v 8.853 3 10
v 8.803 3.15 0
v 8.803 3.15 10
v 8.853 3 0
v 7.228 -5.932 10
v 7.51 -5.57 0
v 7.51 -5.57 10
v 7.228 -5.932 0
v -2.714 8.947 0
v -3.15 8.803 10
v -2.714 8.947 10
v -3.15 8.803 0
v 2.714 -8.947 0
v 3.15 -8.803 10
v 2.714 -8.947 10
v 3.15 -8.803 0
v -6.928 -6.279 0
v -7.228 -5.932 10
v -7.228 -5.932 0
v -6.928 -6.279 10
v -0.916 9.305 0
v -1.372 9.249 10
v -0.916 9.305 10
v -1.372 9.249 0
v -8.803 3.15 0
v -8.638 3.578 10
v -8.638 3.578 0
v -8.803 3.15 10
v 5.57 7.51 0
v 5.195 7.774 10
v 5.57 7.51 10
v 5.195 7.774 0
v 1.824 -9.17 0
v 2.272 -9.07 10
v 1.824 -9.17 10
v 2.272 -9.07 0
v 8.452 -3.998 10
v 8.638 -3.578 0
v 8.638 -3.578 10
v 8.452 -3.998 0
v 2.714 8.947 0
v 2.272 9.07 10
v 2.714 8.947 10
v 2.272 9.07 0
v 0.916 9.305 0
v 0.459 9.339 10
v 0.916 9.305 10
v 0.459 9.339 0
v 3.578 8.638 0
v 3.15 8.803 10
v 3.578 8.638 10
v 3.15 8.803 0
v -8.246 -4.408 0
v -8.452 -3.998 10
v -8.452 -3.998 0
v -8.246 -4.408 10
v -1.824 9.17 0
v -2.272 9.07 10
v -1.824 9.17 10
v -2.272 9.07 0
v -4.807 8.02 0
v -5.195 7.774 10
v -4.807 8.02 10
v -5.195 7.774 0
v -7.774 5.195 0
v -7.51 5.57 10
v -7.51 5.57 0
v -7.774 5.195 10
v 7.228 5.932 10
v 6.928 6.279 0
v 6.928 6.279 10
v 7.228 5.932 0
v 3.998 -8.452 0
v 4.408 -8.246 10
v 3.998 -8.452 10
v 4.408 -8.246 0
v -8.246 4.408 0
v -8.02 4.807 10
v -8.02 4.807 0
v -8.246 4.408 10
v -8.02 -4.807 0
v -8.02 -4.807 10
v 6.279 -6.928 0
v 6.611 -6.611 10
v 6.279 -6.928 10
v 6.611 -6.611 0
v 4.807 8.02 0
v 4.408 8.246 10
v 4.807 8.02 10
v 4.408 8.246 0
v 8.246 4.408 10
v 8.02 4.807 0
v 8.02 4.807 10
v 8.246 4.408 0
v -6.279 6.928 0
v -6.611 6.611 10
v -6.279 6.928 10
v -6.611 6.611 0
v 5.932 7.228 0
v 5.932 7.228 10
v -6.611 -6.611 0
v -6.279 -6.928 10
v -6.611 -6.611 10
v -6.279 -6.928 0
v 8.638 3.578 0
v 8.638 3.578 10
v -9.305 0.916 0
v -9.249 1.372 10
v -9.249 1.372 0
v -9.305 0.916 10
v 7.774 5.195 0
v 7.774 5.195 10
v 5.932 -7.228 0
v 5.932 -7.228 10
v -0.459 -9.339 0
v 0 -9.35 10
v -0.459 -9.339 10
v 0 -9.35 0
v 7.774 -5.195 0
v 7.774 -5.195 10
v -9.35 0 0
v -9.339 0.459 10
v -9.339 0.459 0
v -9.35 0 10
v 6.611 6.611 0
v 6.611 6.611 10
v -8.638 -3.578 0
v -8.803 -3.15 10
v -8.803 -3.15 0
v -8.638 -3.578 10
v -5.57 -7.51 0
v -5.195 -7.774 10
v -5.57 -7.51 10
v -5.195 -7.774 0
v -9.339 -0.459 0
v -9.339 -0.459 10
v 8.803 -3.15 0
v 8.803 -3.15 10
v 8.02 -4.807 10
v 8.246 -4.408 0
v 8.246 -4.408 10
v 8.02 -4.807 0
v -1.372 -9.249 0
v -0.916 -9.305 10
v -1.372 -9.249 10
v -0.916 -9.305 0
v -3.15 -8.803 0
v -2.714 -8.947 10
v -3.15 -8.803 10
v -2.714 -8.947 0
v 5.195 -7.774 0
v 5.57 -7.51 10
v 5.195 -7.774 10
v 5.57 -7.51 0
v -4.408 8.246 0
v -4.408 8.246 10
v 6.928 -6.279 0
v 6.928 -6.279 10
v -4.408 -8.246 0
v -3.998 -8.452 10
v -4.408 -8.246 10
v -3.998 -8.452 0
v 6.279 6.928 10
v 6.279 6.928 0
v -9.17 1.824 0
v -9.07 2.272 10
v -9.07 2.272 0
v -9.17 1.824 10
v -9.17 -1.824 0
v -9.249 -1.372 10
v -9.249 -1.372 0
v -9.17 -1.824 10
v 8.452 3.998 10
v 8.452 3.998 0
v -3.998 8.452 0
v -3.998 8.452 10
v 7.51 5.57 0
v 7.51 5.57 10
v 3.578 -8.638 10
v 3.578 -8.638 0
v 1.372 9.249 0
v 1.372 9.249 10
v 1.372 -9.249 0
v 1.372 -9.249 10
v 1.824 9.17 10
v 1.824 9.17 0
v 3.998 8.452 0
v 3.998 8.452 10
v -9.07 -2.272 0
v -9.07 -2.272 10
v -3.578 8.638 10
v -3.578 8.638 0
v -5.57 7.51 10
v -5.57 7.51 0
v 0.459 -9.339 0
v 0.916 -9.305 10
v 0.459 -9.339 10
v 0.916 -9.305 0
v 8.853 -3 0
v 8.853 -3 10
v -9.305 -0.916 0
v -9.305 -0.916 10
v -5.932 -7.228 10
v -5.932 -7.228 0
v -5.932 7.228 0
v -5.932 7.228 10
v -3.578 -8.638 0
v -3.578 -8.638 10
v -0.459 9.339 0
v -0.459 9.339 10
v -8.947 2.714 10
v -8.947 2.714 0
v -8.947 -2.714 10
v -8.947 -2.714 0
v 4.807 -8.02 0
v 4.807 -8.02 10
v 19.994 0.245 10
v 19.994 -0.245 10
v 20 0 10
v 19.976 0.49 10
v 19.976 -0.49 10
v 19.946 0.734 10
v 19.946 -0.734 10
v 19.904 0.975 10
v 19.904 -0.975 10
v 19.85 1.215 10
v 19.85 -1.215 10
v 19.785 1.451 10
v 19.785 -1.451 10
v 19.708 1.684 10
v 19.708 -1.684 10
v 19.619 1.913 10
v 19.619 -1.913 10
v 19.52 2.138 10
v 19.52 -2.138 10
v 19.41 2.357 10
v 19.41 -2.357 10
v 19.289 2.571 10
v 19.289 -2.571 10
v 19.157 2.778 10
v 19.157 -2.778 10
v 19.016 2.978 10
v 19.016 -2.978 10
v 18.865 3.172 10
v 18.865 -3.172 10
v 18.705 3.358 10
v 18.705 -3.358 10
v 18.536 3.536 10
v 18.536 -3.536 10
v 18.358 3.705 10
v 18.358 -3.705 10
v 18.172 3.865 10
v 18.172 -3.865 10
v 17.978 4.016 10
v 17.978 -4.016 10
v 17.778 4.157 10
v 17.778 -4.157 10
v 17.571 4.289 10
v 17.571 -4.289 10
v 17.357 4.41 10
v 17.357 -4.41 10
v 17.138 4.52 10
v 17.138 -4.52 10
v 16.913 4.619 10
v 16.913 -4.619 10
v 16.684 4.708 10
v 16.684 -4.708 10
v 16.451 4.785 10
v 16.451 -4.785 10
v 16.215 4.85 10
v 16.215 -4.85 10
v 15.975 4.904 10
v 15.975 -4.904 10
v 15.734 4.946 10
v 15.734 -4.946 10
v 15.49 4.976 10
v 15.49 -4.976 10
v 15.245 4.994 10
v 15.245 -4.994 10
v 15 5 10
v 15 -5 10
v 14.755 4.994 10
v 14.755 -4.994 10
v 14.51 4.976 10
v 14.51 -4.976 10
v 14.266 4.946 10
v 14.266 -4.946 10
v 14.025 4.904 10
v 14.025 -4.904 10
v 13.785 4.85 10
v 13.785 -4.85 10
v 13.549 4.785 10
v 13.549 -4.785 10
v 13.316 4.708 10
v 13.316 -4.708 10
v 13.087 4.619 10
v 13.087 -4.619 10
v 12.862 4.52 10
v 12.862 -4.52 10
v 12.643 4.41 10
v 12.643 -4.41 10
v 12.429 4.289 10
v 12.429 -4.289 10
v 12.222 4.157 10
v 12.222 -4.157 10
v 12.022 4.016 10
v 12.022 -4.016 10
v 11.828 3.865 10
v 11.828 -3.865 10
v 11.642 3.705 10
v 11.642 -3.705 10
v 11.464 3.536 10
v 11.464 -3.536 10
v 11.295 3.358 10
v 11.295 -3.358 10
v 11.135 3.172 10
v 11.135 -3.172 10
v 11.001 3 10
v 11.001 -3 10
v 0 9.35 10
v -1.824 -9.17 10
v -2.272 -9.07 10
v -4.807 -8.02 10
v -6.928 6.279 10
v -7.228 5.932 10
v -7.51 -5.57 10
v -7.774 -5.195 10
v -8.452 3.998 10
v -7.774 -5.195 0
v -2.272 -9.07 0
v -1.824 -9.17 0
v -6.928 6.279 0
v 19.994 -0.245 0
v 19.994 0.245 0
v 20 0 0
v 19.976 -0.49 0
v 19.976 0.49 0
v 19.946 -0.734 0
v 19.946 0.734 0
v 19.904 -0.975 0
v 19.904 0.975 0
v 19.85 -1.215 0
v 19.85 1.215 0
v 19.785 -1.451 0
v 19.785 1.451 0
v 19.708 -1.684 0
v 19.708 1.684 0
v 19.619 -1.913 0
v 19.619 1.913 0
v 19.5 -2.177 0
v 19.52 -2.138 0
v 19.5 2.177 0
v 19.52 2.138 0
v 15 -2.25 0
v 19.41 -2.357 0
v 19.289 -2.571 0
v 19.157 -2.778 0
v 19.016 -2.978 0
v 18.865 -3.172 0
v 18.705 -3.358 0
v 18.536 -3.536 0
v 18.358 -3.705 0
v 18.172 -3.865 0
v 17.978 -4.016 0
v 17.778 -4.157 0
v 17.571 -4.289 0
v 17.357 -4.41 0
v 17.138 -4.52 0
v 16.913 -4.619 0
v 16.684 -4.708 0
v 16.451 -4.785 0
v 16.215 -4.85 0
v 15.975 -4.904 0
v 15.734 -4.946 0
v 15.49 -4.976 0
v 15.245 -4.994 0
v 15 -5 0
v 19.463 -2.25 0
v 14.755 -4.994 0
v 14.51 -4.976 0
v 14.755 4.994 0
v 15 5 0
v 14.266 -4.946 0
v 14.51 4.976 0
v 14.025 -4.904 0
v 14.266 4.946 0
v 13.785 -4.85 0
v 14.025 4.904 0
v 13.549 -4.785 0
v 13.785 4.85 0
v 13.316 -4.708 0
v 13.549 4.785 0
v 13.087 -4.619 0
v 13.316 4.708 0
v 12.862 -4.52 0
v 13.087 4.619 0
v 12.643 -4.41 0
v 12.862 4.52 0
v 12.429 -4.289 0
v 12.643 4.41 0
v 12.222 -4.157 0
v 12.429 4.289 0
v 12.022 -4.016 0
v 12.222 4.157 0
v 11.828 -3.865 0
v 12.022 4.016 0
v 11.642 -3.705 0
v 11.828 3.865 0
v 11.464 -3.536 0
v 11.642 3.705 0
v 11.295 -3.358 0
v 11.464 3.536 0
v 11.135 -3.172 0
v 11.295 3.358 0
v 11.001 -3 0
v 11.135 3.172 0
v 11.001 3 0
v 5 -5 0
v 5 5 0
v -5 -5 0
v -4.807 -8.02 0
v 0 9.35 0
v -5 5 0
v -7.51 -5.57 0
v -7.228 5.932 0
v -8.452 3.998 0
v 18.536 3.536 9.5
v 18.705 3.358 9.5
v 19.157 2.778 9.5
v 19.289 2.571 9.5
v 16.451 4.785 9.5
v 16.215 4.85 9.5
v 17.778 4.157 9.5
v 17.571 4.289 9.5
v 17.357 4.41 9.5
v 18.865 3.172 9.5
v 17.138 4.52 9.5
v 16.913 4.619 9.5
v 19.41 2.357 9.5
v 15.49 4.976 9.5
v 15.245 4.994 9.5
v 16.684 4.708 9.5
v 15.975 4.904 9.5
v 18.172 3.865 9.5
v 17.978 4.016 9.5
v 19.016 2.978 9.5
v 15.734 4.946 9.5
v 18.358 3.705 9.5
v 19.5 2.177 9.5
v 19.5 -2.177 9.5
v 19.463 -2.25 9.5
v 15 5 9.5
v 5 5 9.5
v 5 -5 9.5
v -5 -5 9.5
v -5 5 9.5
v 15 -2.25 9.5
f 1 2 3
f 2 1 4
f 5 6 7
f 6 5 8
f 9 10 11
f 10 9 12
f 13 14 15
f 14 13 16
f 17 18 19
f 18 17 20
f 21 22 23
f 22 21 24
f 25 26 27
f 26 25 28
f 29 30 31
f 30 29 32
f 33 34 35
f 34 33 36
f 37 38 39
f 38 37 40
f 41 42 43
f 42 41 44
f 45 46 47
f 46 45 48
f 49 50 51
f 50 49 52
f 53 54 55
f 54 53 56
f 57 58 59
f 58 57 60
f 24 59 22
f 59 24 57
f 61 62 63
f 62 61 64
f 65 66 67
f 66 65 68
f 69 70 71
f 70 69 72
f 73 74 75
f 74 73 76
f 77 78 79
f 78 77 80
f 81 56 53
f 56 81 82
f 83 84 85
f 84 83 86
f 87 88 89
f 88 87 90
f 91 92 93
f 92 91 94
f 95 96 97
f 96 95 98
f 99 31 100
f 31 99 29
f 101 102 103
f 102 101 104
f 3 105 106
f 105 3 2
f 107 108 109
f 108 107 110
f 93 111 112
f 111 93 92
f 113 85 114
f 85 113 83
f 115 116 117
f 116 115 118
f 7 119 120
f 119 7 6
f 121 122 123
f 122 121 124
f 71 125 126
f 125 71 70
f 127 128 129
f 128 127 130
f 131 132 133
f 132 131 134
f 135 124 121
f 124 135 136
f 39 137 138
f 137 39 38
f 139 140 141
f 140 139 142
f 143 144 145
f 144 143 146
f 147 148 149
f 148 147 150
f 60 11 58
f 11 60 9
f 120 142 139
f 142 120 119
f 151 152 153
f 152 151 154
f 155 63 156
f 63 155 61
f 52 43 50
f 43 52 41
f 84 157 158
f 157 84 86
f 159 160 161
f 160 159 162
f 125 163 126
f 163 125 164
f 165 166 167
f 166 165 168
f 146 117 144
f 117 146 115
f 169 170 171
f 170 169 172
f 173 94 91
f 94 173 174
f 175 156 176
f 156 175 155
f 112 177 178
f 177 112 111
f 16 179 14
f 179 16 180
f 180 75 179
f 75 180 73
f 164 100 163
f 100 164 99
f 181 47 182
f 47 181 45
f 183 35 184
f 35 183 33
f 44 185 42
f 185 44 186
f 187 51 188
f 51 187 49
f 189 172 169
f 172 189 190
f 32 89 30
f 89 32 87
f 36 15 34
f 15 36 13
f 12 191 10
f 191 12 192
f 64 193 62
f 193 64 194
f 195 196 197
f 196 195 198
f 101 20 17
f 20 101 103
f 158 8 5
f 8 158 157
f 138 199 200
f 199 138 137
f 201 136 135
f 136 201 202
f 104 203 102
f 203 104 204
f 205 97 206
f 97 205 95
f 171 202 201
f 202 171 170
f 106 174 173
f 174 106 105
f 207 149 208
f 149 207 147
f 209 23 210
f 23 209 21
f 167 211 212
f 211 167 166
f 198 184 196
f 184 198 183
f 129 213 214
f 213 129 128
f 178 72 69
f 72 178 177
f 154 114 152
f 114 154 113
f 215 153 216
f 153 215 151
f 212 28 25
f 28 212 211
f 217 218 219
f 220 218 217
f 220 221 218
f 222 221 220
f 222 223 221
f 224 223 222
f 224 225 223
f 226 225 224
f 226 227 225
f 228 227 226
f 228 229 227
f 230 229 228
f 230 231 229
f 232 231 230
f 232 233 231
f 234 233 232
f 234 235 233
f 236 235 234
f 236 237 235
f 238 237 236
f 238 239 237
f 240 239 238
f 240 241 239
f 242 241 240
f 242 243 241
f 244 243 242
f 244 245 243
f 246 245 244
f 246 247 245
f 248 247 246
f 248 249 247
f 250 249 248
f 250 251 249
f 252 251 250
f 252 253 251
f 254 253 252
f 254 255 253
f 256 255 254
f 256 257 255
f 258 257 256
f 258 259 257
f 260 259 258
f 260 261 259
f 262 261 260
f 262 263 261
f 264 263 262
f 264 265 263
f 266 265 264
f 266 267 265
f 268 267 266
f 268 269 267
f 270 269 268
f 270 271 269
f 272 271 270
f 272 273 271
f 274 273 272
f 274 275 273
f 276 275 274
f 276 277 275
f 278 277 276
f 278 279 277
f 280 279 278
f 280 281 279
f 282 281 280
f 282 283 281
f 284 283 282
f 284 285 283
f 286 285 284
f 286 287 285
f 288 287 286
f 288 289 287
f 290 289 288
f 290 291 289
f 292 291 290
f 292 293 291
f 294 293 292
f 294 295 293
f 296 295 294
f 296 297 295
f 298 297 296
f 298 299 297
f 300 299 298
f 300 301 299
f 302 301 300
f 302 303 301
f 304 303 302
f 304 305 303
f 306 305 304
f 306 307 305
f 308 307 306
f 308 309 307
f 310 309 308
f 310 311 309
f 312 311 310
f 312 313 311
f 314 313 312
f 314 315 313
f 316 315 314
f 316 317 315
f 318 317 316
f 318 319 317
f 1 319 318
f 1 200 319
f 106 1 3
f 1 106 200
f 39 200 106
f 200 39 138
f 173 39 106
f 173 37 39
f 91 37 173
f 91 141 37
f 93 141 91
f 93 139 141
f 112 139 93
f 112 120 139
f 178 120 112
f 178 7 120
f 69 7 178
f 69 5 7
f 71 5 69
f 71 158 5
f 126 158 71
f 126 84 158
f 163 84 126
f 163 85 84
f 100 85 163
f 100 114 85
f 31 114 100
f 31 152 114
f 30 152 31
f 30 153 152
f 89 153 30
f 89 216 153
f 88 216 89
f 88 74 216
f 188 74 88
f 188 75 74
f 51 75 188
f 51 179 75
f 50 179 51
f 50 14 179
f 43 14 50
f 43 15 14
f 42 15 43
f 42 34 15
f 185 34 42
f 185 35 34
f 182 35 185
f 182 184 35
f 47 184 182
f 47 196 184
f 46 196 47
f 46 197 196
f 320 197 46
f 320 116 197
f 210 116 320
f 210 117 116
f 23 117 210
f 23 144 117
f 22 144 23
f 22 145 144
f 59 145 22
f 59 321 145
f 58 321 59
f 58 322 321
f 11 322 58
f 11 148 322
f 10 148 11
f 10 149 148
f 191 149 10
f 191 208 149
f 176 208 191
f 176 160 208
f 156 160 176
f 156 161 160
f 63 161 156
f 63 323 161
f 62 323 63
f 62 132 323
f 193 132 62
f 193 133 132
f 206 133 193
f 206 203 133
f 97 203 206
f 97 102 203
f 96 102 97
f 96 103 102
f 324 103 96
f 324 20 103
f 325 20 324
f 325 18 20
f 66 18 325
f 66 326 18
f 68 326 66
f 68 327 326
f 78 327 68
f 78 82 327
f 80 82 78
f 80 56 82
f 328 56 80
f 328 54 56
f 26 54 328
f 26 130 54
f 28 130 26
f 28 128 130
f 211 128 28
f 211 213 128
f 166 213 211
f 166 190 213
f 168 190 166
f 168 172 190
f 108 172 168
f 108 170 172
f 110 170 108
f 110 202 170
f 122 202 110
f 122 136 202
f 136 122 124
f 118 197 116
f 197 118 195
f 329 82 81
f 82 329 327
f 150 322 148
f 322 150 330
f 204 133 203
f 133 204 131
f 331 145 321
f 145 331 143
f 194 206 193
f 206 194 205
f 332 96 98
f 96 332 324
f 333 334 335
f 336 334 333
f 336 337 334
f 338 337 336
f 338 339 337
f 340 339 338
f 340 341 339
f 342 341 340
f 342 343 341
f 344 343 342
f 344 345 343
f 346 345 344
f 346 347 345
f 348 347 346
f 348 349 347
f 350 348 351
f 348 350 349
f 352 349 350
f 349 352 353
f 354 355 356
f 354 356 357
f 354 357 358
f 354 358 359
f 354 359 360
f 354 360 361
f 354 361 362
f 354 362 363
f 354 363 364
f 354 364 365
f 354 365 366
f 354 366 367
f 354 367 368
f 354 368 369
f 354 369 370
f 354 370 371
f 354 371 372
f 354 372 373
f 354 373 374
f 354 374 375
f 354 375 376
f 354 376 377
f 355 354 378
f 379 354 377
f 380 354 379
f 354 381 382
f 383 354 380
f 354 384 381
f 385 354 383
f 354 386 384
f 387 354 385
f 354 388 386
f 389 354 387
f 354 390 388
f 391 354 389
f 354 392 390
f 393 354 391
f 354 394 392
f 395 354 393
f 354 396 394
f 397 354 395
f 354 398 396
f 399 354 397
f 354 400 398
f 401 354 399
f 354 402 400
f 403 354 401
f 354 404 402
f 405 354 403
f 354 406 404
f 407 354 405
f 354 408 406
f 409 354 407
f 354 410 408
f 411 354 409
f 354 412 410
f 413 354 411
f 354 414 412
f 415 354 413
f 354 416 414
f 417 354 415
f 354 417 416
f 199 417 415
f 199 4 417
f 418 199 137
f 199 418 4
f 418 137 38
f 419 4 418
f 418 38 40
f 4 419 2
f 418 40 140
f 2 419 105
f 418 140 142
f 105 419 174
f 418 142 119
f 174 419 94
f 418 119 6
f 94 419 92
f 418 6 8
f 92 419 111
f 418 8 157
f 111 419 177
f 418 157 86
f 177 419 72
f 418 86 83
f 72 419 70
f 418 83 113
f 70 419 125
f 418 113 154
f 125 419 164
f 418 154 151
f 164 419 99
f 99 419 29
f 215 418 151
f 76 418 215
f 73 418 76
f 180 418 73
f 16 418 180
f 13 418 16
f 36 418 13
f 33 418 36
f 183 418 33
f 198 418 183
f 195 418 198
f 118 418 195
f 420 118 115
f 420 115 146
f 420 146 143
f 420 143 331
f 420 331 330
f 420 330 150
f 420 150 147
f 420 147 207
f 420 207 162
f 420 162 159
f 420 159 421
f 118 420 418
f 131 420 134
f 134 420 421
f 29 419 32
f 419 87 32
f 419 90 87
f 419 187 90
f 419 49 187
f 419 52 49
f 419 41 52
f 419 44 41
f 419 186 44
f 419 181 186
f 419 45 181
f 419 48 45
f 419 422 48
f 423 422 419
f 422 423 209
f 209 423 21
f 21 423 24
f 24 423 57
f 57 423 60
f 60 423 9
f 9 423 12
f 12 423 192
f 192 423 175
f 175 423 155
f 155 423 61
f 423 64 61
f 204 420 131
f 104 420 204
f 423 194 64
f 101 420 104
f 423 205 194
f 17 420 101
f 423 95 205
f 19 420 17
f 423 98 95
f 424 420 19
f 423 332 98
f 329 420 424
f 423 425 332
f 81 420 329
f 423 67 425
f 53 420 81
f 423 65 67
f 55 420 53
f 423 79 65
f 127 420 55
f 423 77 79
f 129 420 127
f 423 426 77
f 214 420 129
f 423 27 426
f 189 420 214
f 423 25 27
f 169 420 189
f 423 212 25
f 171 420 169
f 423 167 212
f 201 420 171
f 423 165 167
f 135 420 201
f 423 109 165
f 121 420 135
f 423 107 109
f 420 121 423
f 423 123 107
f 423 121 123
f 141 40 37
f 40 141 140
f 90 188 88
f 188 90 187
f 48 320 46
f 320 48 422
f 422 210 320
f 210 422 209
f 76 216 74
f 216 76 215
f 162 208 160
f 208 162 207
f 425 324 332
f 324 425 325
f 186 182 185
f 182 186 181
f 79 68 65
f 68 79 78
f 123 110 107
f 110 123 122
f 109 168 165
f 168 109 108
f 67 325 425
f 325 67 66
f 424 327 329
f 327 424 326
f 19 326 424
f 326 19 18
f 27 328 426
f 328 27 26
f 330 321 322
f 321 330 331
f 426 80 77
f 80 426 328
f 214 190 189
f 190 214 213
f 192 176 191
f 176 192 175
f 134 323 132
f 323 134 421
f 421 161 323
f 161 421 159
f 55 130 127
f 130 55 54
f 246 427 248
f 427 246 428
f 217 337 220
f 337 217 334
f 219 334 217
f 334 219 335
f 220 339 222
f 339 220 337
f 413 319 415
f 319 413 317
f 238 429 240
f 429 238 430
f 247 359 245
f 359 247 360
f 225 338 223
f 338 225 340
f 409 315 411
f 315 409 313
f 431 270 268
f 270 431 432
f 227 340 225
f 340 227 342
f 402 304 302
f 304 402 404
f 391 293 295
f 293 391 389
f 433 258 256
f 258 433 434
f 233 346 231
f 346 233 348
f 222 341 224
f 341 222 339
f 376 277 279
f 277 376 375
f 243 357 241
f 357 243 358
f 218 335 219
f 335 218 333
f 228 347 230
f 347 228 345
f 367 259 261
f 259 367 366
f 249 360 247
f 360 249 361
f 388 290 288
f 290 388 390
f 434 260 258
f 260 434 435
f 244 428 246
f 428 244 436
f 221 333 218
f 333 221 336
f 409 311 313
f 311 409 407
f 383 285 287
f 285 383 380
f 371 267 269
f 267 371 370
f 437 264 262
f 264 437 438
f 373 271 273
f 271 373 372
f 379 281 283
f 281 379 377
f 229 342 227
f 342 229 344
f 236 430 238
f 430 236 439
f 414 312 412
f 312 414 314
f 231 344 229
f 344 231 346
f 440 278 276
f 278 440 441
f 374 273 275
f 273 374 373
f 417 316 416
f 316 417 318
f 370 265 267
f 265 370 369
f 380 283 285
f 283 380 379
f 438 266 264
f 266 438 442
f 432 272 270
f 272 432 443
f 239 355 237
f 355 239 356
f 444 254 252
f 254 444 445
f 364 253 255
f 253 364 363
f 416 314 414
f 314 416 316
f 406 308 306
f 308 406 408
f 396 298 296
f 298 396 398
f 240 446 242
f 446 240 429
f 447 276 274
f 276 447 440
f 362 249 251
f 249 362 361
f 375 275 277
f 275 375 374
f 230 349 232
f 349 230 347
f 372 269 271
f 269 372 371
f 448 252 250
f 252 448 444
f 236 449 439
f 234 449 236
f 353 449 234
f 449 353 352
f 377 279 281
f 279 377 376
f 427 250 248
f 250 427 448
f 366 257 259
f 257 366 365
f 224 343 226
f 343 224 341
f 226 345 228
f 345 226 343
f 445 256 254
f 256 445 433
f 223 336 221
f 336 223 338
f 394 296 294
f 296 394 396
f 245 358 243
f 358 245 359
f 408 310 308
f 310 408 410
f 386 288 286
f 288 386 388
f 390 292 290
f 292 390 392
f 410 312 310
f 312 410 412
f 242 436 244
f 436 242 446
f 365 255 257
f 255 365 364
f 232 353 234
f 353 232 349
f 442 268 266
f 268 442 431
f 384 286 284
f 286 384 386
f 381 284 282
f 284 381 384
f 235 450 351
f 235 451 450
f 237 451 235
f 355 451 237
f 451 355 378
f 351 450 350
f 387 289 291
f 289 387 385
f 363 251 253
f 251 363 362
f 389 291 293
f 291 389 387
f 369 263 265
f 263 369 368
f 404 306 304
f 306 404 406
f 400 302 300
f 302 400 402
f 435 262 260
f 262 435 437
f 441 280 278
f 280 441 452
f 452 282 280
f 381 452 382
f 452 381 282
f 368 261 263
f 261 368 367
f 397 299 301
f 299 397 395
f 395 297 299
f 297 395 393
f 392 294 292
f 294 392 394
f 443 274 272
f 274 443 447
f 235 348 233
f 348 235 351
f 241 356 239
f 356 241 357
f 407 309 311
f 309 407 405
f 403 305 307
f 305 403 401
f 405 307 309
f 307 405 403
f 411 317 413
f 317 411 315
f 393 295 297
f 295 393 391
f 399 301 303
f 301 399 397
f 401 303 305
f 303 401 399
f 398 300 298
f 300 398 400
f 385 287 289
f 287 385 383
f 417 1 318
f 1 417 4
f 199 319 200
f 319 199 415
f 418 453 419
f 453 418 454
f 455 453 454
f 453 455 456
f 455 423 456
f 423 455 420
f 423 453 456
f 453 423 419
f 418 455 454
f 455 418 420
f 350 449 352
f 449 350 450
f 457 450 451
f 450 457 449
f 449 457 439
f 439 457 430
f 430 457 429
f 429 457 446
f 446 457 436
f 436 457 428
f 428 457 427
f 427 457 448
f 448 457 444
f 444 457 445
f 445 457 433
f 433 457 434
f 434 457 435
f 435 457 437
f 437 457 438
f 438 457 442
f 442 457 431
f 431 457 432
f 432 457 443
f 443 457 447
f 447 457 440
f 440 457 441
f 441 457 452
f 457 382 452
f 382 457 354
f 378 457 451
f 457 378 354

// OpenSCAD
// Tubing clip for 12.7 mm lab stand rod
// Print orientation: flat on bed, extruded up +Z

// ---- Rod ring ----
rod_id   = 12.7;   // inner diameter of rod ring
rod_wall  = 3;     // wall thickness
rod_od   = rod_id + 2 * rod_wall; // outer diameter = 18.7
rod_open  = 10;    // width of opening cut from -X side

// ---- Tubing ring ----
tub_id   = 6;      // inner diameter of tubing ring
tub_wall  = 2;     // wall thickness
tub_od   = tub_id + 2 * tub_wall; // outer diameter = 10
tub_x    = 15;     // centre x position
tub_open  = 4.5;   // width of opening cut from +X side

// ---- Bridge ----
bridge_w  = 6;     // bridge width (Y)
bridge_x0 = 8;     // bridge start (X)
bridge_x1 = 12;    // bridge end (X)

// ---- Misc ----
eps = 0.5;         // cutter overshoot past faces
$fn = 128;         // circle resolution

difference() {
    union() {
        // Rod ring
        cylinder(d = rod_od, h = 10);
        // Tubing ring
        translate([tub_x, 0, 0])
            cylinder(d = tub_od, h = 10);
        // Solid bridge
        translate([bridge_x0, -bridge_w / 2, 0])
            cube([bridge_x1 - bridge_x0, bridge_w, 10]);
    }
    // Rod ring opening: removes everything with x < 0 and -5 < y < 5
    translate([-rod_open / 2, -5, -eps])
        cube([rod_open, 10, 10]);
    // Tubing ring opening: removes x > 15 and -2.25 < y < 2.25
    translate([tub_x, -tub_open / 2, -eps])
        cube([tub_open, 10, 10]);
}
